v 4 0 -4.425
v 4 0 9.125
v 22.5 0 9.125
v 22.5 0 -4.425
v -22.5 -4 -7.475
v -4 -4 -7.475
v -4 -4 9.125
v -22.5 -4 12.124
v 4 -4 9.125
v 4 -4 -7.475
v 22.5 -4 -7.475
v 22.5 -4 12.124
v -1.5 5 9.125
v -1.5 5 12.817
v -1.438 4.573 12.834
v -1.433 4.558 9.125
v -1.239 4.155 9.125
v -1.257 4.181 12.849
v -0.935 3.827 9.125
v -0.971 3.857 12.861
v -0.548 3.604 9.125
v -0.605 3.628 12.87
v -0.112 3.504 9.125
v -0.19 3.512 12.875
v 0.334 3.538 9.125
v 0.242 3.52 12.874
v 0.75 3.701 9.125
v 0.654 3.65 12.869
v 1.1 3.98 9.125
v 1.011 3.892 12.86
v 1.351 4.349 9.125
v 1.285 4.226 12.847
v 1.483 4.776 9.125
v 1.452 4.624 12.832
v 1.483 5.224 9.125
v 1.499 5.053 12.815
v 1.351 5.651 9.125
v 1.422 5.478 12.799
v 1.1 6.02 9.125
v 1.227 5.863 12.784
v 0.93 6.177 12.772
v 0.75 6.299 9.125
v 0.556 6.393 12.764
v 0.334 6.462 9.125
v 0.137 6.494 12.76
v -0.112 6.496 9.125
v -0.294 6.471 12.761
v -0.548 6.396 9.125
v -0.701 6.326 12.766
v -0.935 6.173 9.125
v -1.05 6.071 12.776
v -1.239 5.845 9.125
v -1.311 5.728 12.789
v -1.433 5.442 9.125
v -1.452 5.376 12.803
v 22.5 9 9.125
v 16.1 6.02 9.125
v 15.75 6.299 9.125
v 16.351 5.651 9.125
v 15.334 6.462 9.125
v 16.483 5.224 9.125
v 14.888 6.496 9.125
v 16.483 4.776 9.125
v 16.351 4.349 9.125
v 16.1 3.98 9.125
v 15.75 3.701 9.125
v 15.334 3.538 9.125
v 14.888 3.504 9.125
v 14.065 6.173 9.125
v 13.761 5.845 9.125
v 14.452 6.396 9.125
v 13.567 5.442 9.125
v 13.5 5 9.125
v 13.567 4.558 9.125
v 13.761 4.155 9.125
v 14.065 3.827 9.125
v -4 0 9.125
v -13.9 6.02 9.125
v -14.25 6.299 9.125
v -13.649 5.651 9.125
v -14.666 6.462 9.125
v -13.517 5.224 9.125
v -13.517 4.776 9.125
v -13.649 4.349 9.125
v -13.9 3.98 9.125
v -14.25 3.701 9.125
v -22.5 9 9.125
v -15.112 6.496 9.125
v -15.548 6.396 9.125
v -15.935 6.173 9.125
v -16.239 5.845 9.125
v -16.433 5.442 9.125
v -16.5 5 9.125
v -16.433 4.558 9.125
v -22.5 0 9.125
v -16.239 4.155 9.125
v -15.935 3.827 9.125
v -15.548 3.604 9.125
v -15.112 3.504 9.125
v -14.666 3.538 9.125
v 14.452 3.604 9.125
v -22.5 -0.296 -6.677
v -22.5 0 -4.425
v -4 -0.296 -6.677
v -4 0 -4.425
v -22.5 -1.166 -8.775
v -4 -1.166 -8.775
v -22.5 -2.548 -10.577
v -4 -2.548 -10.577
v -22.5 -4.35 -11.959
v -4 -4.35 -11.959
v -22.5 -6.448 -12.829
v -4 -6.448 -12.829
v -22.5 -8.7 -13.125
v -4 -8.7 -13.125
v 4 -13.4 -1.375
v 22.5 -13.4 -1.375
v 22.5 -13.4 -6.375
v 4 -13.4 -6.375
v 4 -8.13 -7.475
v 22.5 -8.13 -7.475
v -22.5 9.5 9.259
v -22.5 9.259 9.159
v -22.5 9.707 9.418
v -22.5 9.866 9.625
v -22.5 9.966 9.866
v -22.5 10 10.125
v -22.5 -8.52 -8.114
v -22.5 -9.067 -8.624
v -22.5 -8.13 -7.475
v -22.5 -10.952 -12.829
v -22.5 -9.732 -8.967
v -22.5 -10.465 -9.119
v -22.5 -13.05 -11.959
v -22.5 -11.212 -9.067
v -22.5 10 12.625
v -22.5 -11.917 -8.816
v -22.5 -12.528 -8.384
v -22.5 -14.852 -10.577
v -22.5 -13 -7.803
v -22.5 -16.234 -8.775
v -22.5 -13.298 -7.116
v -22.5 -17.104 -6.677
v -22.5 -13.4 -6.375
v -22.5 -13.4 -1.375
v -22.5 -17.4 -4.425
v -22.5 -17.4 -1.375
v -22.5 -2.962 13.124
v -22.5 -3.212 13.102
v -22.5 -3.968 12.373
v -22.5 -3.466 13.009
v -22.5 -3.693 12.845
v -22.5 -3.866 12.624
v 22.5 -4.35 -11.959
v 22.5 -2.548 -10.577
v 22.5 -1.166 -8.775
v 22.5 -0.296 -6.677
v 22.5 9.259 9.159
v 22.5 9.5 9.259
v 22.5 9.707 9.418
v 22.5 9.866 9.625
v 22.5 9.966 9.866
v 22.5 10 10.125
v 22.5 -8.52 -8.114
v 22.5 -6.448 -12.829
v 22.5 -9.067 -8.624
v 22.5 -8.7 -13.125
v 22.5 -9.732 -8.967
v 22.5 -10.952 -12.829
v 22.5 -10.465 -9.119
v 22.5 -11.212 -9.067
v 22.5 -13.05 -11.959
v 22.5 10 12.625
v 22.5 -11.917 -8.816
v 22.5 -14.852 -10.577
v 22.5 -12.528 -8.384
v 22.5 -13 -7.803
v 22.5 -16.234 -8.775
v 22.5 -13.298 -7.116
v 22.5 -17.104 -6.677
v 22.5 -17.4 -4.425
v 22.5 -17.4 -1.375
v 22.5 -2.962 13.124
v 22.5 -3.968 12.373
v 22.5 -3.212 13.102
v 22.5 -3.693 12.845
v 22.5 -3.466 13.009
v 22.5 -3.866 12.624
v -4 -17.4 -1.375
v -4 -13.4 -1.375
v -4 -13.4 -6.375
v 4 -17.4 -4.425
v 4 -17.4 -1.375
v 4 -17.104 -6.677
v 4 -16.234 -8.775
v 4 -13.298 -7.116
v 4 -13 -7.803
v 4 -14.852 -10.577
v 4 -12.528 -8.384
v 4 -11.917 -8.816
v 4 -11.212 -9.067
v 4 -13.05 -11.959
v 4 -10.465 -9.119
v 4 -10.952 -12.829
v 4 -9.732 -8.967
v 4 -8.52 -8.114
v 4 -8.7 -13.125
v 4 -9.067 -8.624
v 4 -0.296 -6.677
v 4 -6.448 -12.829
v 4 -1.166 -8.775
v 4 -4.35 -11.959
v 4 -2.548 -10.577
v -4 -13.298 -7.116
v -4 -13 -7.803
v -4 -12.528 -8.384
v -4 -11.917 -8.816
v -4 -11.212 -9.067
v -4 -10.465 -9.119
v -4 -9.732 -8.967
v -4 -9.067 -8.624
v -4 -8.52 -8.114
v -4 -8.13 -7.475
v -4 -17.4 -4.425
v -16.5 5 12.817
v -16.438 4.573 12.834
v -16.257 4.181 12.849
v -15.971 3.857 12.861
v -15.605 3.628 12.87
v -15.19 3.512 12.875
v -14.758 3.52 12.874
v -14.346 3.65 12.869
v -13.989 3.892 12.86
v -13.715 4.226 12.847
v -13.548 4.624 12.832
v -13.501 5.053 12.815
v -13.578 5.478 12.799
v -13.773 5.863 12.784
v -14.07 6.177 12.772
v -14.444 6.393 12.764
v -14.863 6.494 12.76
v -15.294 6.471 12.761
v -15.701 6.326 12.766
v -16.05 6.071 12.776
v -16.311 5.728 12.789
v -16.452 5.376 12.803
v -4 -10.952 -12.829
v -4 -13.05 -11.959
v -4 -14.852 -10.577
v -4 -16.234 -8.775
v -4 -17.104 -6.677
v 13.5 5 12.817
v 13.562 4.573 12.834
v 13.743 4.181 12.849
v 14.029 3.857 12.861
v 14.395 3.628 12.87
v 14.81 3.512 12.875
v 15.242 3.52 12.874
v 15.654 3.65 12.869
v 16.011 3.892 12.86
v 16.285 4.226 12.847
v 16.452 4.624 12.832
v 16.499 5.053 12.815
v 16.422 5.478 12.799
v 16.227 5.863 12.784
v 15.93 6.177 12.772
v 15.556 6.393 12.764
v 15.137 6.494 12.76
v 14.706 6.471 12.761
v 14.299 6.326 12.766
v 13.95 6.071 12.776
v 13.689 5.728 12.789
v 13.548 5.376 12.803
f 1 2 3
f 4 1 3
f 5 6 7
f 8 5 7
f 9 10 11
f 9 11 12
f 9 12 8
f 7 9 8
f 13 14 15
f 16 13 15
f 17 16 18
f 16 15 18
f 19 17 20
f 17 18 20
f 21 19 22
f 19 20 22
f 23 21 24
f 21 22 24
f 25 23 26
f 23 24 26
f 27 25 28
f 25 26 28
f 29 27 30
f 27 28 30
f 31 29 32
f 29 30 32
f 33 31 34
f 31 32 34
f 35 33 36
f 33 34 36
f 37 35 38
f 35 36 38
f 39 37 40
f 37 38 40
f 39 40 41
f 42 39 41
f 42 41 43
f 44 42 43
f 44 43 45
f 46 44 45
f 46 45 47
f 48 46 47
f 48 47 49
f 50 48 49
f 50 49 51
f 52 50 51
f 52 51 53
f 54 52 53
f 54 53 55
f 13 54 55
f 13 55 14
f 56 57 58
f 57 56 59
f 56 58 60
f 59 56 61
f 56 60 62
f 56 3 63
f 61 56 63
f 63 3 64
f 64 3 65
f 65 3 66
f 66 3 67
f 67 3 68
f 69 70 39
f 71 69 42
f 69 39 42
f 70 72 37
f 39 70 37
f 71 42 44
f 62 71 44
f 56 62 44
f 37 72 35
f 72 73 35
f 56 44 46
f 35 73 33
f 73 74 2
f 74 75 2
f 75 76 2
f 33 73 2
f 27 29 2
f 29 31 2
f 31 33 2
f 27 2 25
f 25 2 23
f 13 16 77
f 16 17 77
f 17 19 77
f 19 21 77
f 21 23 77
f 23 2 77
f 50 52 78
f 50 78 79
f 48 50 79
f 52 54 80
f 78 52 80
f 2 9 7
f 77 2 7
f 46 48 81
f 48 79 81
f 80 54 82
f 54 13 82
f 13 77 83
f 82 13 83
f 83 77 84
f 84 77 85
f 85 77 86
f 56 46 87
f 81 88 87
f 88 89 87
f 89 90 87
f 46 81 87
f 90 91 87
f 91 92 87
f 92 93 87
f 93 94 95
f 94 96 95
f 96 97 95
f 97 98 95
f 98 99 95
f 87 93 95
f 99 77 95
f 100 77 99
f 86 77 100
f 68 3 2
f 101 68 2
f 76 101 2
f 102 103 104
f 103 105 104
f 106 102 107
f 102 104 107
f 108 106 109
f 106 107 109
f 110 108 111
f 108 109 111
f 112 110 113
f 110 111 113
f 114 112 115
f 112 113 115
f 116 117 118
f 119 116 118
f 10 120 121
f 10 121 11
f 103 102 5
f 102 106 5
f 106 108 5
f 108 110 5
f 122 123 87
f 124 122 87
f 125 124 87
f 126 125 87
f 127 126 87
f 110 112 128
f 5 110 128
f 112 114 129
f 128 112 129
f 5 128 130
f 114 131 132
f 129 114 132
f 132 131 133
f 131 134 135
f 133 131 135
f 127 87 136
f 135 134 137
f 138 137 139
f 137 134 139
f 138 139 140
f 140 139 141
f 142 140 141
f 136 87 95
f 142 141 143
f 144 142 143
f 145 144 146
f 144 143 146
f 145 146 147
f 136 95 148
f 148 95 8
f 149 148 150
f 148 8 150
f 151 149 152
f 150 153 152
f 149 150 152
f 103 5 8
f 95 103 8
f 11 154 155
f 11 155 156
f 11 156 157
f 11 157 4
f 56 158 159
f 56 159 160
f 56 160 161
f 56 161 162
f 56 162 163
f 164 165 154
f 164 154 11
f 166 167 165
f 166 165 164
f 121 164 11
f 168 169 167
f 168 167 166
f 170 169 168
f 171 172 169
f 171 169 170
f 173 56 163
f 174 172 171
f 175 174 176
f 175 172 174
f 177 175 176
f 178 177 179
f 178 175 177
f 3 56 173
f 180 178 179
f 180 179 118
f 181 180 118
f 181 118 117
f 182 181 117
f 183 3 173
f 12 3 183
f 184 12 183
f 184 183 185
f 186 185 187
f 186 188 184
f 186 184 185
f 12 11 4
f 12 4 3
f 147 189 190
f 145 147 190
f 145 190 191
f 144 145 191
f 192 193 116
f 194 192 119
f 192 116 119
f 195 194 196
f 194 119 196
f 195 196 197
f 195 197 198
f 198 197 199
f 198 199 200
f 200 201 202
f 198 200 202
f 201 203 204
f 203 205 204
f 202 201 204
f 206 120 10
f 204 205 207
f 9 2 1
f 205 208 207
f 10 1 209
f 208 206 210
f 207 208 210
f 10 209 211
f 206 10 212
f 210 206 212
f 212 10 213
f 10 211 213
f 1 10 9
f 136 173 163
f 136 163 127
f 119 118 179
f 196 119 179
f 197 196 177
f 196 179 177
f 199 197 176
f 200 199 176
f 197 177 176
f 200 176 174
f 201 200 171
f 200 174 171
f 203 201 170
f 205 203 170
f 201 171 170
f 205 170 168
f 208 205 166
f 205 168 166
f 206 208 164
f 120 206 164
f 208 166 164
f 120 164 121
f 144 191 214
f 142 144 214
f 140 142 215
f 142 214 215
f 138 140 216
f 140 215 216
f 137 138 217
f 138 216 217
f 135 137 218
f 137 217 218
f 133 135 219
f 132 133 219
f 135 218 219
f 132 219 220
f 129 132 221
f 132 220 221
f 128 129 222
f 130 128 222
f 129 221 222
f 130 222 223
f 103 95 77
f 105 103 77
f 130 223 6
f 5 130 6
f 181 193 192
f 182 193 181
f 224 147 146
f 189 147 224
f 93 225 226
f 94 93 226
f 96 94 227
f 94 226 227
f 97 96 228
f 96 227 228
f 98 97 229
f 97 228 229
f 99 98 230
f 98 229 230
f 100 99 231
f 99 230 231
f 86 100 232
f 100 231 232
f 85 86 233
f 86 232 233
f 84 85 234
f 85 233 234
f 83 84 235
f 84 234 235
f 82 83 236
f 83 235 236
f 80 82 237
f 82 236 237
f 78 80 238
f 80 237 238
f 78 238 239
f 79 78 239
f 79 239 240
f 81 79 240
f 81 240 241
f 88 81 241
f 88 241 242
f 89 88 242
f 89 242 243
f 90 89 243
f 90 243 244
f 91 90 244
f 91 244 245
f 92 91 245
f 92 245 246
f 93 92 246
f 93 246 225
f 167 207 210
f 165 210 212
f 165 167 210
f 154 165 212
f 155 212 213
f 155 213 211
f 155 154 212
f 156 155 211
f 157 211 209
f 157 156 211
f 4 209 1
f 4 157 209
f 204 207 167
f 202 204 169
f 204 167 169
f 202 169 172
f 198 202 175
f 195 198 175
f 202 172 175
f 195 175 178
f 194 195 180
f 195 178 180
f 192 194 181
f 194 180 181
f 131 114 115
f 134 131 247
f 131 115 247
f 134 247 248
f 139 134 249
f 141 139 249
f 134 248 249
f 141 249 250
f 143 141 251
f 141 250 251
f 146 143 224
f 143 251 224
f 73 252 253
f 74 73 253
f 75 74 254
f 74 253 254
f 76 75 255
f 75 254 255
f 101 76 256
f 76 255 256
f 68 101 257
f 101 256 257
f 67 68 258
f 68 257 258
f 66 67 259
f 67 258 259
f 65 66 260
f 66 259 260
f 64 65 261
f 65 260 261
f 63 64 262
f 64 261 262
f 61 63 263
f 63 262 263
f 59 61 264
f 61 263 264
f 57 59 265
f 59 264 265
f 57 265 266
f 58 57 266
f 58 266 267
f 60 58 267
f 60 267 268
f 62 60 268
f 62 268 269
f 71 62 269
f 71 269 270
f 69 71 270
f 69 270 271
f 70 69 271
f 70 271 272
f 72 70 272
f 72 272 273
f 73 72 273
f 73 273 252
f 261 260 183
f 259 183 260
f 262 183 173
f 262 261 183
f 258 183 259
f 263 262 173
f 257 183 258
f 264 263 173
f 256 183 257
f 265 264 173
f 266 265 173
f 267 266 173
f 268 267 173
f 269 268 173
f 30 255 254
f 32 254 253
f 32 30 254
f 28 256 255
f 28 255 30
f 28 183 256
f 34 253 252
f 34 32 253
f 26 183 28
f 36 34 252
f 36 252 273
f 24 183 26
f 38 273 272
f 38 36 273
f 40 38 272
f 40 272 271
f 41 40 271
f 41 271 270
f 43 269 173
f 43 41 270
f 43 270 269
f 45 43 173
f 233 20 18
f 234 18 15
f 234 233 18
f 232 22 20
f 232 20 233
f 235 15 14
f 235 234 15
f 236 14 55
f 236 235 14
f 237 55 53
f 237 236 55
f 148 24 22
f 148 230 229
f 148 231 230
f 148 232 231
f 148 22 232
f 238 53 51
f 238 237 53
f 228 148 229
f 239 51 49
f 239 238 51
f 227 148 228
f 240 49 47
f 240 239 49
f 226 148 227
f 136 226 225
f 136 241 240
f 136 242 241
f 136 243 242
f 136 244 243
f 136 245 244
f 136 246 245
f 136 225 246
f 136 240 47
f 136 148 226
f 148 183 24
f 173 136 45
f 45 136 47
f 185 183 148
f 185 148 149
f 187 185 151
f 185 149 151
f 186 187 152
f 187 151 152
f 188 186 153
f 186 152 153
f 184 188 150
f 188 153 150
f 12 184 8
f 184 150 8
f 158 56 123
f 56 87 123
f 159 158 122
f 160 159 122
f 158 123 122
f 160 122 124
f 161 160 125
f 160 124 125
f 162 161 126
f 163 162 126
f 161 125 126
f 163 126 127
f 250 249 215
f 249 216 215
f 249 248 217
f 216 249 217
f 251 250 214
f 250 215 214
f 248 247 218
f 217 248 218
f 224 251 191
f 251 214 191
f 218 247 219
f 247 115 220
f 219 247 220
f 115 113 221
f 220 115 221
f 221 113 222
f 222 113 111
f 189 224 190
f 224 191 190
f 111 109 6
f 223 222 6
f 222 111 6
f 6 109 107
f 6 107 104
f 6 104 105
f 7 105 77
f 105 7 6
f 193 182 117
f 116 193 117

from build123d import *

# Parameters (mm, degrees)
F0_W        = 45
F0_H        = 26.25
F1_DEPTH    = 17.4
F2_W        = 45
F2_H        = 4
F3_DEPTH    = 10
F5_DEPTH    = 45
F7_D        = 3
F8_T1_DEPTH = 112.5981529113
F9_W        = 8
F9_H        = 22.25
F9_H_2      = 1.1180170857
F10_DEPTH   = 21.5
F11_R       = 8.69999
F12_R       = 1


# Not quite as in the source:
# - a fillet or chamfer that OpenCascade refuses, or shapes differently, is made with other operations: its cross-section is extruded or revolved along the edge and cut away or added
# - a fillet or chamfer is up to 0.001 mm smaller than in the source, because OpenCascade refuses the exact size


with BuildPart() as f1:
    # F0 (on Front) → F1 (new body)
    with BuildSketch(Plane.XZ):
        Rectangle(F0_W, F0_H)
    extrude(amount=F1_DEPTH)

    # F2 (on face) → F3 (join)
    with BuildSketch(Plane(origin=(0, 0, 0), x_dir=(-1, 0, 0), z_dir=(0, 1, 0))):
        with Locations((0, 11.125)):
            Rectangle(F2_W, F2_H)
    extrude(amount=F3_DEPTH)

    # F4 (on face) → F5 (cut)
    with BuildSketch(Plane.YZ.offset(22.5)):
        with BuildLine():
            Line((-13.4, -1.375), (-13.4, -6.375))
            ThreePointArc((-13.4, -6.375), (-11.2118515201, -9.0669923606), (-8.1295833678, -7.475))
            Line((-8.1295833678, -7.475), (-4.5024615599, -7.475))
            Line((-4.5024615599, -7.475), (-4, -7.475))
            Line((-4, -7.475), (-4, 13.125))
            Line((-4, 13.125), (-17.4, 13.125))
            Line((-17.4, 13.125), (-17.4, -1.375))
            Line((-17.4, -1.375), (-13.4, -1.375))
        make_face()
    extrude(amount=-F5_DEPTH, mode=Mode.SUBTRACT)

    # F7 (through all)
    with Locations(Plane(origin=(0, 0, 9.125), x_dir=(1, 0, 0), z_dir=(0, 0, -1))):
        with Locations((-15, -5), (0, -5), (15, -5)):
            Hole(F7_D / 2)

    # F8: chamfer of 13 x 0.5 on 1 edges, made by hand

    # F8_s2 → F8_t1 (cut)
    with BuildSketch(Plane.YZ.offset(-56.2990764557)):
        Polygon((-3, 13.125), (10, 12.625), (10, 13.125), align=None)
    extrude(amount=F8_T1_DEPTH, mode=Mode.SUBTRACT)

    # F9 (on face) → F10 (cut)
    with BuildSketch(Plane(origin=(0, 0, 0), x_dir=(-1, 0, 0), z_dir=(0, 1, 0))):
        with Locations((0, -2)):
            Rectangle(F9_W, F9_H)
        with Locations((0, -13.6840085428)):
            Rectangle(F9_W, F9_H_2)
    extrude(amount=-F10_DEPTH, mode=Mode.SUBTRACT)

    # F11 (radius 8.7 in the source; OpenCascade refuses exactly that, so slightly less here)
    f11_edges = [f1.edges().sort_by_distance(p)[0] for p in [
        (-13.25, -17.4, -13.125),
        (-13.25, 0, -13.125),
        (13.25, -17.4, -13.125),
        (13.25, 0, -13.125),
    ]]
    fillet(f11_edges, radius=F11_R)

    # F12
    f12_edges = [f1.edges().sort_by_distance(p)[0] for p in [
        (0, 10, 9.125),
        (0, -4, 13.125),
    ]]
    fillet(f12_edges, radius=F12_R)


solid = f1.part
